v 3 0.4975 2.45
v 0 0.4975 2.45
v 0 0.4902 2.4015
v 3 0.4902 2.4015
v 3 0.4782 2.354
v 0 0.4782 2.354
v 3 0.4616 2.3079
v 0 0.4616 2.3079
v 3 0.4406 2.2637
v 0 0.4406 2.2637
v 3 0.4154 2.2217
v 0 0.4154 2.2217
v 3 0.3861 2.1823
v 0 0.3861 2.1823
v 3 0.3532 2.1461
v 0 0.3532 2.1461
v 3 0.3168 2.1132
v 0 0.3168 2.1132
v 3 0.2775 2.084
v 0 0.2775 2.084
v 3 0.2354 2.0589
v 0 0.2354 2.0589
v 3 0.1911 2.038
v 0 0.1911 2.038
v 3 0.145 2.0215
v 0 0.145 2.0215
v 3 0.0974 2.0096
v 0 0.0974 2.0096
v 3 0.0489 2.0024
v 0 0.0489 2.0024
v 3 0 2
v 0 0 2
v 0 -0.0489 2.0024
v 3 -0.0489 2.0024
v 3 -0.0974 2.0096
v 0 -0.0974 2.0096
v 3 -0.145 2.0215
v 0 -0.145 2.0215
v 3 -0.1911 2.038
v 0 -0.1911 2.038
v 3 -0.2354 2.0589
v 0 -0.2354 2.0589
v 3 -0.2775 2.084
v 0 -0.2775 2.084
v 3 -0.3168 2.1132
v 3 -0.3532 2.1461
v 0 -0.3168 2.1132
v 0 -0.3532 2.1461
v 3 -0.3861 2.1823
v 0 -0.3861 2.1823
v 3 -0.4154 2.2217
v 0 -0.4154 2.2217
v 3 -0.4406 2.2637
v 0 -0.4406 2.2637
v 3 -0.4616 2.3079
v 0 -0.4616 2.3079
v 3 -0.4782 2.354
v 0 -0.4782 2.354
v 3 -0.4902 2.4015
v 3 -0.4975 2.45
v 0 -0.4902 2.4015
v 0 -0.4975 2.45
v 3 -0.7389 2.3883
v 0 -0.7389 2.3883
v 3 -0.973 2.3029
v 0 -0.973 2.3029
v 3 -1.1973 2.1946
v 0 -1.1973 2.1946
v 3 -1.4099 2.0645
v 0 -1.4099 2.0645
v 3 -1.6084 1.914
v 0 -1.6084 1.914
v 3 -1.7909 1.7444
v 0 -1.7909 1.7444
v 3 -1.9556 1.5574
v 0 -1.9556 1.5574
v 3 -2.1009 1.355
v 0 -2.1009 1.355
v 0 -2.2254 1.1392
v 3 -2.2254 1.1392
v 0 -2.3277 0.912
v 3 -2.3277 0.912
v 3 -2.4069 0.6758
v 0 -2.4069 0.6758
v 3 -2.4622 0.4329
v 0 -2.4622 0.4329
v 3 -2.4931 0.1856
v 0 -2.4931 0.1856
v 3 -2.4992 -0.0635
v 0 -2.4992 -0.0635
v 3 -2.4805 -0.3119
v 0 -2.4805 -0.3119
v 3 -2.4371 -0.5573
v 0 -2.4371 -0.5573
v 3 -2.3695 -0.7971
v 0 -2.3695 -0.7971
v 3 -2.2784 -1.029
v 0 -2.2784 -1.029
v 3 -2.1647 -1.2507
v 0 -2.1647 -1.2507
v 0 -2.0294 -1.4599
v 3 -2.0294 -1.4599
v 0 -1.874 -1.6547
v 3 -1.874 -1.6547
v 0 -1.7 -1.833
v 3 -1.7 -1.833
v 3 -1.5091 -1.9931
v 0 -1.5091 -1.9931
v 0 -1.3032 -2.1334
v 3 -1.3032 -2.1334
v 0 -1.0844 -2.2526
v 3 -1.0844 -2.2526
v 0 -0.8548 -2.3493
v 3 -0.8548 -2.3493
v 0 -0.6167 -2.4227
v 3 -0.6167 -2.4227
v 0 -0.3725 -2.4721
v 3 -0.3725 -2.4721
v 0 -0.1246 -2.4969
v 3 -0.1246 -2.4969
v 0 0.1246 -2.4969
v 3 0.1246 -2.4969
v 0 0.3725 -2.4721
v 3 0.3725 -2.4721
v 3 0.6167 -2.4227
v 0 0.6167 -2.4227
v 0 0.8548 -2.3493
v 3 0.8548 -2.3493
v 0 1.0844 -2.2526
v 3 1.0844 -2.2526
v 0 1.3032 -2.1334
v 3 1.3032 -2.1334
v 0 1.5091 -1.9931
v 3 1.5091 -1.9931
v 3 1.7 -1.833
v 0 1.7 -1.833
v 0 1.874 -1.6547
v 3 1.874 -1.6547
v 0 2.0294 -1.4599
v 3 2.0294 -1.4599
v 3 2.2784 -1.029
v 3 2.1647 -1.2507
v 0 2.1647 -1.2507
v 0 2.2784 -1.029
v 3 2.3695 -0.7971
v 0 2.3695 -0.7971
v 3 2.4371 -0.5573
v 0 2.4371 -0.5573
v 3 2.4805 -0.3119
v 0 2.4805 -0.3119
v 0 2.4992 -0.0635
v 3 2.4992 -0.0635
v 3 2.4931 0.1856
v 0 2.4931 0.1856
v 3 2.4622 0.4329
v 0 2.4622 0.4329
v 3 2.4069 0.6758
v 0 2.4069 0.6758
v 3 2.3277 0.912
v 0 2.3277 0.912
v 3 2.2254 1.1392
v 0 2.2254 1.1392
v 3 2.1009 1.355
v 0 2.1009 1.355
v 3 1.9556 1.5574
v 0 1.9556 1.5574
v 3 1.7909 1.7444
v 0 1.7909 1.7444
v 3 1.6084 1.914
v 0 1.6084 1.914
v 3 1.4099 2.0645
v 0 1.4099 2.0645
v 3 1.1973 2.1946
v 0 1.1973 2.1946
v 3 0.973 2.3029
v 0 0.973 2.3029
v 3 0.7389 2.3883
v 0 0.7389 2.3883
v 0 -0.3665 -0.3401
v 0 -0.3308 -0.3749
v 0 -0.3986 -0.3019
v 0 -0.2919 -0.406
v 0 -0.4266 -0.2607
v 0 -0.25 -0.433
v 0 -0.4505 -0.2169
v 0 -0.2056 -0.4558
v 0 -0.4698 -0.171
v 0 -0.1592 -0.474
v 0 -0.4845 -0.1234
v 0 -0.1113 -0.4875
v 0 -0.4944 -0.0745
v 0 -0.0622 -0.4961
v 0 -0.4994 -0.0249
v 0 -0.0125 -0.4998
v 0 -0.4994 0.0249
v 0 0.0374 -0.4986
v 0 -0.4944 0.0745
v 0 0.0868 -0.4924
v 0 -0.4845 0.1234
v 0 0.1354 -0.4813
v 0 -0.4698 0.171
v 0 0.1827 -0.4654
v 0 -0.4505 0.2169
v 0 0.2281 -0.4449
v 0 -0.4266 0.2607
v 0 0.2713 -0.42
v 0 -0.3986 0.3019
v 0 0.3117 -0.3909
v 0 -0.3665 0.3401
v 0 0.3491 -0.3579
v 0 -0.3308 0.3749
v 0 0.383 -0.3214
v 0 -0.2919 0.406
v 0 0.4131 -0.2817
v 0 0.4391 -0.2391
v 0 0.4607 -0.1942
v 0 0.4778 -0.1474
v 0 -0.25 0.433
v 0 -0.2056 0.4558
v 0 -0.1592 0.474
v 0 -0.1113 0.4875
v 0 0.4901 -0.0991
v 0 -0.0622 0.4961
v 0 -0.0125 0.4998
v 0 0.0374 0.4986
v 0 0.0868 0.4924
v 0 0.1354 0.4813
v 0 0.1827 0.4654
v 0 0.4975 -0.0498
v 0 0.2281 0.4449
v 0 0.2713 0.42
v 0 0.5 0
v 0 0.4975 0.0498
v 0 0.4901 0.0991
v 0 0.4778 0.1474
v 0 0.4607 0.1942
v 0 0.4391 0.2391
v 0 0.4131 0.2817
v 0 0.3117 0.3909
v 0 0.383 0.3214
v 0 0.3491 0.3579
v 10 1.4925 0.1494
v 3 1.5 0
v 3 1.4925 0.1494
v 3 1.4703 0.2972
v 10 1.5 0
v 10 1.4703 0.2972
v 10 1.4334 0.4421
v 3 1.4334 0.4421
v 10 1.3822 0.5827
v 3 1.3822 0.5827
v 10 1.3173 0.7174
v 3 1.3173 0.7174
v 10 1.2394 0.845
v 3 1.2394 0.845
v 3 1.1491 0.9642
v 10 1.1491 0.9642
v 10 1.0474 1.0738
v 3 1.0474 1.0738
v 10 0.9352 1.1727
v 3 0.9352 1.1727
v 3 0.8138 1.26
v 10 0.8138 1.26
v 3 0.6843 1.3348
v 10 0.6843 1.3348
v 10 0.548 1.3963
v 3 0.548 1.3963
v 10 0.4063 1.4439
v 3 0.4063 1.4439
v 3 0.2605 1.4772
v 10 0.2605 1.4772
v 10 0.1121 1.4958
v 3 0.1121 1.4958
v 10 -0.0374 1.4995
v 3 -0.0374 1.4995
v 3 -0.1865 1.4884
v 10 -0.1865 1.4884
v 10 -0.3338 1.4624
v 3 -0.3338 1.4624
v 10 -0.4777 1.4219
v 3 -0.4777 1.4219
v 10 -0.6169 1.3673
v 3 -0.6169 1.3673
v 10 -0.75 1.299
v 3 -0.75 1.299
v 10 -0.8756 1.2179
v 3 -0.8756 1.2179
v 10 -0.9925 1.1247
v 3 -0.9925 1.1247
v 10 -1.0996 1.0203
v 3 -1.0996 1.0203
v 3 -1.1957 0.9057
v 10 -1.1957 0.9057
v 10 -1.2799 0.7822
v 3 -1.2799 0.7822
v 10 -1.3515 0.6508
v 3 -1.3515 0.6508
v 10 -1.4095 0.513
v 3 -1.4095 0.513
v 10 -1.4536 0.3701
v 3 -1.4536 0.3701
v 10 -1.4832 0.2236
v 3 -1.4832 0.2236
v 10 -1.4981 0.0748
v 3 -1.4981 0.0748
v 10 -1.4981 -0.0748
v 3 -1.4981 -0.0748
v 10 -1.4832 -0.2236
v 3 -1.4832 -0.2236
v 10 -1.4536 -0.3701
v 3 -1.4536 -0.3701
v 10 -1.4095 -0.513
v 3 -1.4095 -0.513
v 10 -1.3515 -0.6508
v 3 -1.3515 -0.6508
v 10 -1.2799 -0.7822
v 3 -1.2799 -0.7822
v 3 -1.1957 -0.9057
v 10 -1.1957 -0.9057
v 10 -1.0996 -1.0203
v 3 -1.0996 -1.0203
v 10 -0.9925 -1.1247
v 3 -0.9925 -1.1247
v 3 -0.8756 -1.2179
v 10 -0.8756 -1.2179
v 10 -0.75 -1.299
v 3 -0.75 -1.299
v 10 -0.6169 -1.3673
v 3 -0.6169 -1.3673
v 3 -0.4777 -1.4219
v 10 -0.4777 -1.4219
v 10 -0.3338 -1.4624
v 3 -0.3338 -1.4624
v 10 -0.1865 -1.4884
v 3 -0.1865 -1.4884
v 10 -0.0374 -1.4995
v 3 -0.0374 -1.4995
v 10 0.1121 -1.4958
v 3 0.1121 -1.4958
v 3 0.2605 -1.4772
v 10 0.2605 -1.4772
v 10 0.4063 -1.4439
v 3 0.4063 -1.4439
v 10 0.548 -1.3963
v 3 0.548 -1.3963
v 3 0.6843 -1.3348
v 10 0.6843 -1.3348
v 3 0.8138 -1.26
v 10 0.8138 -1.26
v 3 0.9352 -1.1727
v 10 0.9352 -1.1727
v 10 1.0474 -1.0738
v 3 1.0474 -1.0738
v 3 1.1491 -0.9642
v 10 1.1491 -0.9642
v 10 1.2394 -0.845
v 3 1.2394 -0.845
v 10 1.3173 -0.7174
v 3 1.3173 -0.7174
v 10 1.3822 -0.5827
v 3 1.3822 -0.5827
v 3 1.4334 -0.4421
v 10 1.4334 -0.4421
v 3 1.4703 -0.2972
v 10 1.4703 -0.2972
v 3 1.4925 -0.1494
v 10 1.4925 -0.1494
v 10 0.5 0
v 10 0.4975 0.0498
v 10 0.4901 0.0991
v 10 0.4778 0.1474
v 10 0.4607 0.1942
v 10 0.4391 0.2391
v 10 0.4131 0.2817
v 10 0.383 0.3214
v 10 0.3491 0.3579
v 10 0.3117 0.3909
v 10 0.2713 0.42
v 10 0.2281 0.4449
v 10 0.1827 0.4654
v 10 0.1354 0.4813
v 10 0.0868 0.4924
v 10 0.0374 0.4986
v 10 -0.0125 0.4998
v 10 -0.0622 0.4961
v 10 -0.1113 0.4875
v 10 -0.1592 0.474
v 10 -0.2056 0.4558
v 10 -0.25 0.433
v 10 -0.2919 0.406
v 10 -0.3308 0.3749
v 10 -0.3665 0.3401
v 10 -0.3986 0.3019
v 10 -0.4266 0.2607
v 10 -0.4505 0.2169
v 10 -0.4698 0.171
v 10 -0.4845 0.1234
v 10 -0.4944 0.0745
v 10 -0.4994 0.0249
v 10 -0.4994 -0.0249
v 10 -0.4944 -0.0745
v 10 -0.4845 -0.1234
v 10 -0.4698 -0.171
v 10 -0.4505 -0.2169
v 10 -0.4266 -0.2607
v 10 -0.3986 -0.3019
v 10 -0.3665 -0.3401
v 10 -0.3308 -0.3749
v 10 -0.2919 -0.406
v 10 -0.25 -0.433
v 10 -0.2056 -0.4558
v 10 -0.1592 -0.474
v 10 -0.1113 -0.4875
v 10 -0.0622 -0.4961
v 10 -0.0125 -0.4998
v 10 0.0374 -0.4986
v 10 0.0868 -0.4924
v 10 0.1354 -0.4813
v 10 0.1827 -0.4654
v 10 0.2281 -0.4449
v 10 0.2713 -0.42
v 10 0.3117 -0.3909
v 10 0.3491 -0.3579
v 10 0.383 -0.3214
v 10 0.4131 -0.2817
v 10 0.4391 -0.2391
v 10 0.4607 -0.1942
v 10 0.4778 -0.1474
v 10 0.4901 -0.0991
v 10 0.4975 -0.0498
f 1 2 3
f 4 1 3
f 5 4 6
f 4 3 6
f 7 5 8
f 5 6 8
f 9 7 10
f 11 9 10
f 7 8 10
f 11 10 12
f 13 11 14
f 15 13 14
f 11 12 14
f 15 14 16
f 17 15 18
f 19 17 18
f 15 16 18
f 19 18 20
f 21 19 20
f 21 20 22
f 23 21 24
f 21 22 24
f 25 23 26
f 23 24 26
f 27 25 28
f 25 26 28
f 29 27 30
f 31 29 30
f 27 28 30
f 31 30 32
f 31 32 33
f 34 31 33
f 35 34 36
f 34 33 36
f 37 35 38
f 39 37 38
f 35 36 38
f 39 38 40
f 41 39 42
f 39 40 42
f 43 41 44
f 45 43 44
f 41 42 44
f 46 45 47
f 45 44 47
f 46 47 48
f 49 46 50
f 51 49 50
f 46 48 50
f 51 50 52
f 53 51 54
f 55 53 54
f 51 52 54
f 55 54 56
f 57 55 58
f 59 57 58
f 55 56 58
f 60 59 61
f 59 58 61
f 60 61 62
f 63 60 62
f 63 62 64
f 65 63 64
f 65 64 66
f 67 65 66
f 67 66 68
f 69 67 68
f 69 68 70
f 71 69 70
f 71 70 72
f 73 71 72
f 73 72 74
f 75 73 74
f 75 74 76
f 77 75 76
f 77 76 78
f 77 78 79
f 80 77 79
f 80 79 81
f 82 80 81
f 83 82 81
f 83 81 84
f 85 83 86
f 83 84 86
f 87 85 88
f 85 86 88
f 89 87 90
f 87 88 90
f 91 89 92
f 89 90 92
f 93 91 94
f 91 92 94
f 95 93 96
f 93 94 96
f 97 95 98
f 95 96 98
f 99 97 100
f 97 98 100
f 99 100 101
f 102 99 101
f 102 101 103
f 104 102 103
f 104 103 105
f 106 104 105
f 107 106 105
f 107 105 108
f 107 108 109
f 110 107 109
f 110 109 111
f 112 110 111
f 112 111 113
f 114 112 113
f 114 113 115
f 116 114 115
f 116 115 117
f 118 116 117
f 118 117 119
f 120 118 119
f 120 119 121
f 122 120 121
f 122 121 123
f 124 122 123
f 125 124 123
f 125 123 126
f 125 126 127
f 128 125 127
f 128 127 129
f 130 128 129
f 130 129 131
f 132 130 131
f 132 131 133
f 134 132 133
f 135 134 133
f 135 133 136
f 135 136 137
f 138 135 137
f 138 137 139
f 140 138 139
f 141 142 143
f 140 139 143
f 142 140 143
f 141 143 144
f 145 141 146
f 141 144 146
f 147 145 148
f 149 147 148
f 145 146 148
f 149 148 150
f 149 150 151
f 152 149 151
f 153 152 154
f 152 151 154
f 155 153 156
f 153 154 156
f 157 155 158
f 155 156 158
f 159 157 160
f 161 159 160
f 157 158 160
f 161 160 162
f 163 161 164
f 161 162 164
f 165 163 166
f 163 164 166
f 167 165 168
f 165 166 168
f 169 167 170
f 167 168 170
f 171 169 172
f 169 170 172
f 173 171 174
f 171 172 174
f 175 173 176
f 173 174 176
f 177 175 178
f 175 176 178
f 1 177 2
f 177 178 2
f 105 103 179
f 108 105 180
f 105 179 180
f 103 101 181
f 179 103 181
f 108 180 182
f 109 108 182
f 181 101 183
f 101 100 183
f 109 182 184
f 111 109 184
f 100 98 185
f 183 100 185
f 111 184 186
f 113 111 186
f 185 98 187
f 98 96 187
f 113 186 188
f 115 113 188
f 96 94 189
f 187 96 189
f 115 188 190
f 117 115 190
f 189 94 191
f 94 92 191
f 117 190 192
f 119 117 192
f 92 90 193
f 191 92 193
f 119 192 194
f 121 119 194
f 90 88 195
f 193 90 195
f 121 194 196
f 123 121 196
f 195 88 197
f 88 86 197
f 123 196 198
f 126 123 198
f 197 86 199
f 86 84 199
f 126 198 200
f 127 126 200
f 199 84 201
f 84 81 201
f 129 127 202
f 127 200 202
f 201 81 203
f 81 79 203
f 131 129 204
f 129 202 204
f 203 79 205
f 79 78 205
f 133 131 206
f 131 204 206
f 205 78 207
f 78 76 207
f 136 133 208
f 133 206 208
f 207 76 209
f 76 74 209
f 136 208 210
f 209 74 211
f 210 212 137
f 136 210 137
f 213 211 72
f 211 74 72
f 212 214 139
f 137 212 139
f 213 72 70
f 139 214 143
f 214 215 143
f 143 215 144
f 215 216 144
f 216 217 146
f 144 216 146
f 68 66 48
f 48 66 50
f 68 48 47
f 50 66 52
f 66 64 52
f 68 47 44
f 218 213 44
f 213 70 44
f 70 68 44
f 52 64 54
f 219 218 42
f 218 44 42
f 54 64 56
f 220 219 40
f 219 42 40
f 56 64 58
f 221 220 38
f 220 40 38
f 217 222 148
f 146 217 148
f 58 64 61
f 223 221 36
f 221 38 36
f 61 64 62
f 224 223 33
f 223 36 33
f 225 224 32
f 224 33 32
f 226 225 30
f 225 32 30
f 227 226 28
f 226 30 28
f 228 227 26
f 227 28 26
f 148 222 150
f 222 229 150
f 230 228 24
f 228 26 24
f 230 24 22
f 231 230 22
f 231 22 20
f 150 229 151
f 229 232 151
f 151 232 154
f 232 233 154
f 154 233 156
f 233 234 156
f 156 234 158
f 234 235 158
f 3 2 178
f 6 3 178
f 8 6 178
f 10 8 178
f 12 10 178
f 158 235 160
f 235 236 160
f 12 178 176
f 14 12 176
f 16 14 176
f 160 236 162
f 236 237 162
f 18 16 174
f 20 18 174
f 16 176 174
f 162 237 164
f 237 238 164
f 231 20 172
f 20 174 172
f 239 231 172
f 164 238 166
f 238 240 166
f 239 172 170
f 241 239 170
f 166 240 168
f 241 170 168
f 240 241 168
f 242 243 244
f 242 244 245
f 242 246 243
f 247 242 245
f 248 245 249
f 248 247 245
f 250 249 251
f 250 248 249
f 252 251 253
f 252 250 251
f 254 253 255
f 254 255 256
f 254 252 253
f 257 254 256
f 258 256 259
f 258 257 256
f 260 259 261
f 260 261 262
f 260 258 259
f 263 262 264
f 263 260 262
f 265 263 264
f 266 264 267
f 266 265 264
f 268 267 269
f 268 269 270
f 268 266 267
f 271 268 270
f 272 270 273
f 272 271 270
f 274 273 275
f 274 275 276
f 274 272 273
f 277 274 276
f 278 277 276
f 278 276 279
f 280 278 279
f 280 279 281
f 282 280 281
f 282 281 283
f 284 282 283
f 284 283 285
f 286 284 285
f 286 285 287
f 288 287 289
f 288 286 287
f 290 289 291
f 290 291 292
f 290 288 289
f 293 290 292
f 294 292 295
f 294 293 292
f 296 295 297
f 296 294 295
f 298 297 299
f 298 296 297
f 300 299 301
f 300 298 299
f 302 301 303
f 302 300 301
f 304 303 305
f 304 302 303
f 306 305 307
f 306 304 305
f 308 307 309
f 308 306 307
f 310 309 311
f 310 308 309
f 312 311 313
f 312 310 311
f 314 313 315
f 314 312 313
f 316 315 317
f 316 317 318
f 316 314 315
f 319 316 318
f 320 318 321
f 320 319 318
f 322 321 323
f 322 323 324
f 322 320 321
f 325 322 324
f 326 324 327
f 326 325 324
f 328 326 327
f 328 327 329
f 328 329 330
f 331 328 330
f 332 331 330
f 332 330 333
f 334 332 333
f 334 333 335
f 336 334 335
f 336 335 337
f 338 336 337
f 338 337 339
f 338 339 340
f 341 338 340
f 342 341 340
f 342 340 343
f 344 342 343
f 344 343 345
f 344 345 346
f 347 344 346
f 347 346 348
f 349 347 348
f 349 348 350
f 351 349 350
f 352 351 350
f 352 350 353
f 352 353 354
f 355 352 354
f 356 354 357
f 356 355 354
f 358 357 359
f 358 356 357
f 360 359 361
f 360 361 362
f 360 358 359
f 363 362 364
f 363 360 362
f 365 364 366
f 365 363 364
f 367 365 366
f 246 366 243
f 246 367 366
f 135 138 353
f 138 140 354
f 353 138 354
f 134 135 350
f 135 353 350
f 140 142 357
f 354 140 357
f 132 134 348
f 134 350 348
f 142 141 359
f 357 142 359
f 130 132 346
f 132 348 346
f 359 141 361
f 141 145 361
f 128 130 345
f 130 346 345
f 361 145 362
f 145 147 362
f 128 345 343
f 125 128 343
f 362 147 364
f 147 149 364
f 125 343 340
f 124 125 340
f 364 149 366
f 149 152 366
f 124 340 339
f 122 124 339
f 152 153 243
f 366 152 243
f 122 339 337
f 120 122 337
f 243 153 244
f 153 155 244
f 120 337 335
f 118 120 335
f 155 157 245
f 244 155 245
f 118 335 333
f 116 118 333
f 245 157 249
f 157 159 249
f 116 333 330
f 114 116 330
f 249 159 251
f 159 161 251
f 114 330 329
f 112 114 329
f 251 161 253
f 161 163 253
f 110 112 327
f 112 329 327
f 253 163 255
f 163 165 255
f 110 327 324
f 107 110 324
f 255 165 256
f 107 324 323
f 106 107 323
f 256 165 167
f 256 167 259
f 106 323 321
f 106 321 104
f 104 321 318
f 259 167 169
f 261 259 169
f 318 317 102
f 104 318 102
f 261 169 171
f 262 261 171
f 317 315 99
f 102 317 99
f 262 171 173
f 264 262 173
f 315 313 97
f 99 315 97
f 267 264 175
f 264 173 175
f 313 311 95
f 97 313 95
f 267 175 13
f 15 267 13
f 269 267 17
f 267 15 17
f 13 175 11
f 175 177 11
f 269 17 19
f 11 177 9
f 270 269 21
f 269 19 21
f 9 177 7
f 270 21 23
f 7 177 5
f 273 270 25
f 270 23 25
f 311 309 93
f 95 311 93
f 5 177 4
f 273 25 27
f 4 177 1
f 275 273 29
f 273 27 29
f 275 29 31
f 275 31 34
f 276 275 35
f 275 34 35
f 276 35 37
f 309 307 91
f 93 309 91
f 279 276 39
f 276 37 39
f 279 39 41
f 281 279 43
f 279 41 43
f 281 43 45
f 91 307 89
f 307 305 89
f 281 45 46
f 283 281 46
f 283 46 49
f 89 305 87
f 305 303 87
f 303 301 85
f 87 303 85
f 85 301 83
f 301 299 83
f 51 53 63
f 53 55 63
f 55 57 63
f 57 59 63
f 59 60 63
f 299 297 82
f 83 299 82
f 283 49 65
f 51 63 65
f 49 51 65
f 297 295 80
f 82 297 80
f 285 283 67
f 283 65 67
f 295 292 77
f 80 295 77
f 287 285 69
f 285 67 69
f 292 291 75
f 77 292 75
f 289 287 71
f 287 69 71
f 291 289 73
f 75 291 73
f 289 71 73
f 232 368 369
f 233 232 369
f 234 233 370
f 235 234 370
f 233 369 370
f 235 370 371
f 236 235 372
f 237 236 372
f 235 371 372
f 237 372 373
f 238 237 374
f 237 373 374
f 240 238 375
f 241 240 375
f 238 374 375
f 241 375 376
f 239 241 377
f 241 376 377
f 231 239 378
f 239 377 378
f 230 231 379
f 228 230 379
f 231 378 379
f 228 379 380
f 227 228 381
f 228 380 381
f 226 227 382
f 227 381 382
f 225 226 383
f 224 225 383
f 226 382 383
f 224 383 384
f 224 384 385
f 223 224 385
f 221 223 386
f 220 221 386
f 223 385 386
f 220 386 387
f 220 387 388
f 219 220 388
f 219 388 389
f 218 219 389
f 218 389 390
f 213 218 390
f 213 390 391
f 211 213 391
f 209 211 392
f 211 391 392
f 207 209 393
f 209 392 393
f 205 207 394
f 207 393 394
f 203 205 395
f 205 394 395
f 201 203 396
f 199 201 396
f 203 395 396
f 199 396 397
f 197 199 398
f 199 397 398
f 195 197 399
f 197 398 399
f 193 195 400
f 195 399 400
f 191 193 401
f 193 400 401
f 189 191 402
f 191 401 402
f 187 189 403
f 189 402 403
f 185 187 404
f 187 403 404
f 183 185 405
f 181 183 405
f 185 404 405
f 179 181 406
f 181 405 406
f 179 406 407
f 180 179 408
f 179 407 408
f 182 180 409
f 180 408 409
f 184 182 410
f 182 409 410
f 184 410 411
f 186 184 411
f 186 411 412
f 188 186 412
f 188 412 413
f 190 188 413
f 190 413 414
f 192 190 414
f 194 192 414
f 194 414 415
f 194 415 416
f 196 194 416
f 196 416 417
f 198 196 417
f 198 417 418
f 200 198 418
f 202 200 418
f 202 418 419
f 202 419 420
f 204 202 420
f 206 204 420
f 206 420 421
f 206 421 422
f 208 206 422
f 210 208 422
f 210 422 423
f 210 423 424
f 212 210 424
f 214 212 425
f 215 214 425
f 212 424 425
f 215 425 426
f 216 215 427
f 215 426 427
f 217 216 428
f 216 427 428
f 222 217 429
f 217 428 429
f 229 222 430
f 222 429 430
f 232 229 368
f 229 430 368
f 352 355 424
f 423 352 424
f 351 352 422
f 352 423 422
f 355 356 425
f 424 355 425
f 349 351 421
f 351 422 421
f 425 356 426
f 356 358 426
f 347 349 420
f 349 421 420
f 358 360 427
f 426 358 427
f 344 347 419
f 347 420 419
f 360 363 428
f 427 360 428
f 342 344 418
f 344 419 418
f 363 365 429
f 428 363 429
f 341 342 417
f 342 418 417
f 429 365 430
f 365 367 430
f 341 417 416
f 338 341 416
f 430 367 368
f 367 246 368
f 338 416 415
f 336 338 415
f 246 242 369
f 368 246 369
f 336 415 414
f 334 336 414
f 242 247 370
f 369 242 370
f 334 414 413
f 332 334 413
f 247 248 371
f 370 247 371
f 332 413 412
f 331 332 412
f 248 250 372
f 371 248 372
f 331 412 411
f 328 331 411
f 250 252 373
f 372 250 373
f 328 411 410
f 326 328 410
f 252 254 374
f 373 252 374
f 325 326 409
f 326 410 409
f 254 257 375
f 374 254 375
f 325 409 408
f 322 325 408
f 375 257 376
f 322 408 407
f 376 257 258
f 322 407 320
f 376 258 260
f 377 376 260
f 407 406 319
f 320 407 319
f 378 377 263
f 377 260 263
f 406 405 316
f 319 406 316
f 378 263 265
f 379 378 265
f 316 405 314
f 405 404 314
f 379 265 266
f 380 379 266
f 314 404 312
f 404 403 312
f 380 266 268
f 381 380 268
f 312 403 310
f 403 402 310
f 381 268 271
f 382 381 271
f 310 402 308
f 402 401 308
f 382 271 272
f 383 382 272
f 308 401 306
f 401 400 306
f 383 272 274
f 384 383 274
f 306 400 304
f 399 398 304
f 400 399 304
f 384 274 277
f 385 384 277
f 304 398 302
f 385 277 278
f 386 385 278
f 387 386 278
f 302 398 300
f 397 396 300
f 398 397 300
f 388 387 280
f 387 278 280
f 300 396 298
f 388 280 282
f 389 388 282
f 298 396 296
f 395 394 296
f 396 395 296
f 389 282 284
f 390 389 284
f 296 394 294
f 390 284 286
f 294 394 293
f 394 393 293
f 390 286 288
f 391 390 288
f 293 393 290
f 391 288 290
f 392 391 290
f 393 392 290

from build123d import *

# Parameters (mm, degrees)
F0_W     = 7
F0_H     = 1.5
F2_R     = 0.5
F3_DEPTH = 10
F5_DEPTH = 3


with BuildPart() as f1:
    # F0 (on Top) → F1 (revolve)
    with BuildSketch(Plane.XY):
        Polygon((0, 1.5), (0, 0), (3, 0), (3, 1.5), (3, 2.5), (0, 2.5), align=None)
        with Locations((6.5, 0.75)):
            Rectangle(F0_W, F0_H)
    revolve(axis=Axis((5, 0, 0), (1, 0, 0)))

    # F2 (on face) → F3 (cut)
    with BuildSketch(Plane.YZ.offset(10)):
        Circle(F2_R)
    extrude(amount=-F3_DEPTH, mode=Mode.SUBTRACT)

    # F4 (on face) → F5 (cut)
    with BuildSketch(Plane(origin=(0, 0, 0), x_dir=(0, -1, 0), z_dir=(-1, 0, 0))):
        with BuildLine():
            ThreePointArc((0.4974937186, 2.45), (0, 2.5), (-0.4974937186, 2.45))
            ThreePointArc((-0.4974937186, 2.45), (0, 2), (0.4974937186, 2.45))
        make_face()
    extrude(amount=-F5_DEPTH, mode=Mode.SUBTRACT)


solid = f1.part
